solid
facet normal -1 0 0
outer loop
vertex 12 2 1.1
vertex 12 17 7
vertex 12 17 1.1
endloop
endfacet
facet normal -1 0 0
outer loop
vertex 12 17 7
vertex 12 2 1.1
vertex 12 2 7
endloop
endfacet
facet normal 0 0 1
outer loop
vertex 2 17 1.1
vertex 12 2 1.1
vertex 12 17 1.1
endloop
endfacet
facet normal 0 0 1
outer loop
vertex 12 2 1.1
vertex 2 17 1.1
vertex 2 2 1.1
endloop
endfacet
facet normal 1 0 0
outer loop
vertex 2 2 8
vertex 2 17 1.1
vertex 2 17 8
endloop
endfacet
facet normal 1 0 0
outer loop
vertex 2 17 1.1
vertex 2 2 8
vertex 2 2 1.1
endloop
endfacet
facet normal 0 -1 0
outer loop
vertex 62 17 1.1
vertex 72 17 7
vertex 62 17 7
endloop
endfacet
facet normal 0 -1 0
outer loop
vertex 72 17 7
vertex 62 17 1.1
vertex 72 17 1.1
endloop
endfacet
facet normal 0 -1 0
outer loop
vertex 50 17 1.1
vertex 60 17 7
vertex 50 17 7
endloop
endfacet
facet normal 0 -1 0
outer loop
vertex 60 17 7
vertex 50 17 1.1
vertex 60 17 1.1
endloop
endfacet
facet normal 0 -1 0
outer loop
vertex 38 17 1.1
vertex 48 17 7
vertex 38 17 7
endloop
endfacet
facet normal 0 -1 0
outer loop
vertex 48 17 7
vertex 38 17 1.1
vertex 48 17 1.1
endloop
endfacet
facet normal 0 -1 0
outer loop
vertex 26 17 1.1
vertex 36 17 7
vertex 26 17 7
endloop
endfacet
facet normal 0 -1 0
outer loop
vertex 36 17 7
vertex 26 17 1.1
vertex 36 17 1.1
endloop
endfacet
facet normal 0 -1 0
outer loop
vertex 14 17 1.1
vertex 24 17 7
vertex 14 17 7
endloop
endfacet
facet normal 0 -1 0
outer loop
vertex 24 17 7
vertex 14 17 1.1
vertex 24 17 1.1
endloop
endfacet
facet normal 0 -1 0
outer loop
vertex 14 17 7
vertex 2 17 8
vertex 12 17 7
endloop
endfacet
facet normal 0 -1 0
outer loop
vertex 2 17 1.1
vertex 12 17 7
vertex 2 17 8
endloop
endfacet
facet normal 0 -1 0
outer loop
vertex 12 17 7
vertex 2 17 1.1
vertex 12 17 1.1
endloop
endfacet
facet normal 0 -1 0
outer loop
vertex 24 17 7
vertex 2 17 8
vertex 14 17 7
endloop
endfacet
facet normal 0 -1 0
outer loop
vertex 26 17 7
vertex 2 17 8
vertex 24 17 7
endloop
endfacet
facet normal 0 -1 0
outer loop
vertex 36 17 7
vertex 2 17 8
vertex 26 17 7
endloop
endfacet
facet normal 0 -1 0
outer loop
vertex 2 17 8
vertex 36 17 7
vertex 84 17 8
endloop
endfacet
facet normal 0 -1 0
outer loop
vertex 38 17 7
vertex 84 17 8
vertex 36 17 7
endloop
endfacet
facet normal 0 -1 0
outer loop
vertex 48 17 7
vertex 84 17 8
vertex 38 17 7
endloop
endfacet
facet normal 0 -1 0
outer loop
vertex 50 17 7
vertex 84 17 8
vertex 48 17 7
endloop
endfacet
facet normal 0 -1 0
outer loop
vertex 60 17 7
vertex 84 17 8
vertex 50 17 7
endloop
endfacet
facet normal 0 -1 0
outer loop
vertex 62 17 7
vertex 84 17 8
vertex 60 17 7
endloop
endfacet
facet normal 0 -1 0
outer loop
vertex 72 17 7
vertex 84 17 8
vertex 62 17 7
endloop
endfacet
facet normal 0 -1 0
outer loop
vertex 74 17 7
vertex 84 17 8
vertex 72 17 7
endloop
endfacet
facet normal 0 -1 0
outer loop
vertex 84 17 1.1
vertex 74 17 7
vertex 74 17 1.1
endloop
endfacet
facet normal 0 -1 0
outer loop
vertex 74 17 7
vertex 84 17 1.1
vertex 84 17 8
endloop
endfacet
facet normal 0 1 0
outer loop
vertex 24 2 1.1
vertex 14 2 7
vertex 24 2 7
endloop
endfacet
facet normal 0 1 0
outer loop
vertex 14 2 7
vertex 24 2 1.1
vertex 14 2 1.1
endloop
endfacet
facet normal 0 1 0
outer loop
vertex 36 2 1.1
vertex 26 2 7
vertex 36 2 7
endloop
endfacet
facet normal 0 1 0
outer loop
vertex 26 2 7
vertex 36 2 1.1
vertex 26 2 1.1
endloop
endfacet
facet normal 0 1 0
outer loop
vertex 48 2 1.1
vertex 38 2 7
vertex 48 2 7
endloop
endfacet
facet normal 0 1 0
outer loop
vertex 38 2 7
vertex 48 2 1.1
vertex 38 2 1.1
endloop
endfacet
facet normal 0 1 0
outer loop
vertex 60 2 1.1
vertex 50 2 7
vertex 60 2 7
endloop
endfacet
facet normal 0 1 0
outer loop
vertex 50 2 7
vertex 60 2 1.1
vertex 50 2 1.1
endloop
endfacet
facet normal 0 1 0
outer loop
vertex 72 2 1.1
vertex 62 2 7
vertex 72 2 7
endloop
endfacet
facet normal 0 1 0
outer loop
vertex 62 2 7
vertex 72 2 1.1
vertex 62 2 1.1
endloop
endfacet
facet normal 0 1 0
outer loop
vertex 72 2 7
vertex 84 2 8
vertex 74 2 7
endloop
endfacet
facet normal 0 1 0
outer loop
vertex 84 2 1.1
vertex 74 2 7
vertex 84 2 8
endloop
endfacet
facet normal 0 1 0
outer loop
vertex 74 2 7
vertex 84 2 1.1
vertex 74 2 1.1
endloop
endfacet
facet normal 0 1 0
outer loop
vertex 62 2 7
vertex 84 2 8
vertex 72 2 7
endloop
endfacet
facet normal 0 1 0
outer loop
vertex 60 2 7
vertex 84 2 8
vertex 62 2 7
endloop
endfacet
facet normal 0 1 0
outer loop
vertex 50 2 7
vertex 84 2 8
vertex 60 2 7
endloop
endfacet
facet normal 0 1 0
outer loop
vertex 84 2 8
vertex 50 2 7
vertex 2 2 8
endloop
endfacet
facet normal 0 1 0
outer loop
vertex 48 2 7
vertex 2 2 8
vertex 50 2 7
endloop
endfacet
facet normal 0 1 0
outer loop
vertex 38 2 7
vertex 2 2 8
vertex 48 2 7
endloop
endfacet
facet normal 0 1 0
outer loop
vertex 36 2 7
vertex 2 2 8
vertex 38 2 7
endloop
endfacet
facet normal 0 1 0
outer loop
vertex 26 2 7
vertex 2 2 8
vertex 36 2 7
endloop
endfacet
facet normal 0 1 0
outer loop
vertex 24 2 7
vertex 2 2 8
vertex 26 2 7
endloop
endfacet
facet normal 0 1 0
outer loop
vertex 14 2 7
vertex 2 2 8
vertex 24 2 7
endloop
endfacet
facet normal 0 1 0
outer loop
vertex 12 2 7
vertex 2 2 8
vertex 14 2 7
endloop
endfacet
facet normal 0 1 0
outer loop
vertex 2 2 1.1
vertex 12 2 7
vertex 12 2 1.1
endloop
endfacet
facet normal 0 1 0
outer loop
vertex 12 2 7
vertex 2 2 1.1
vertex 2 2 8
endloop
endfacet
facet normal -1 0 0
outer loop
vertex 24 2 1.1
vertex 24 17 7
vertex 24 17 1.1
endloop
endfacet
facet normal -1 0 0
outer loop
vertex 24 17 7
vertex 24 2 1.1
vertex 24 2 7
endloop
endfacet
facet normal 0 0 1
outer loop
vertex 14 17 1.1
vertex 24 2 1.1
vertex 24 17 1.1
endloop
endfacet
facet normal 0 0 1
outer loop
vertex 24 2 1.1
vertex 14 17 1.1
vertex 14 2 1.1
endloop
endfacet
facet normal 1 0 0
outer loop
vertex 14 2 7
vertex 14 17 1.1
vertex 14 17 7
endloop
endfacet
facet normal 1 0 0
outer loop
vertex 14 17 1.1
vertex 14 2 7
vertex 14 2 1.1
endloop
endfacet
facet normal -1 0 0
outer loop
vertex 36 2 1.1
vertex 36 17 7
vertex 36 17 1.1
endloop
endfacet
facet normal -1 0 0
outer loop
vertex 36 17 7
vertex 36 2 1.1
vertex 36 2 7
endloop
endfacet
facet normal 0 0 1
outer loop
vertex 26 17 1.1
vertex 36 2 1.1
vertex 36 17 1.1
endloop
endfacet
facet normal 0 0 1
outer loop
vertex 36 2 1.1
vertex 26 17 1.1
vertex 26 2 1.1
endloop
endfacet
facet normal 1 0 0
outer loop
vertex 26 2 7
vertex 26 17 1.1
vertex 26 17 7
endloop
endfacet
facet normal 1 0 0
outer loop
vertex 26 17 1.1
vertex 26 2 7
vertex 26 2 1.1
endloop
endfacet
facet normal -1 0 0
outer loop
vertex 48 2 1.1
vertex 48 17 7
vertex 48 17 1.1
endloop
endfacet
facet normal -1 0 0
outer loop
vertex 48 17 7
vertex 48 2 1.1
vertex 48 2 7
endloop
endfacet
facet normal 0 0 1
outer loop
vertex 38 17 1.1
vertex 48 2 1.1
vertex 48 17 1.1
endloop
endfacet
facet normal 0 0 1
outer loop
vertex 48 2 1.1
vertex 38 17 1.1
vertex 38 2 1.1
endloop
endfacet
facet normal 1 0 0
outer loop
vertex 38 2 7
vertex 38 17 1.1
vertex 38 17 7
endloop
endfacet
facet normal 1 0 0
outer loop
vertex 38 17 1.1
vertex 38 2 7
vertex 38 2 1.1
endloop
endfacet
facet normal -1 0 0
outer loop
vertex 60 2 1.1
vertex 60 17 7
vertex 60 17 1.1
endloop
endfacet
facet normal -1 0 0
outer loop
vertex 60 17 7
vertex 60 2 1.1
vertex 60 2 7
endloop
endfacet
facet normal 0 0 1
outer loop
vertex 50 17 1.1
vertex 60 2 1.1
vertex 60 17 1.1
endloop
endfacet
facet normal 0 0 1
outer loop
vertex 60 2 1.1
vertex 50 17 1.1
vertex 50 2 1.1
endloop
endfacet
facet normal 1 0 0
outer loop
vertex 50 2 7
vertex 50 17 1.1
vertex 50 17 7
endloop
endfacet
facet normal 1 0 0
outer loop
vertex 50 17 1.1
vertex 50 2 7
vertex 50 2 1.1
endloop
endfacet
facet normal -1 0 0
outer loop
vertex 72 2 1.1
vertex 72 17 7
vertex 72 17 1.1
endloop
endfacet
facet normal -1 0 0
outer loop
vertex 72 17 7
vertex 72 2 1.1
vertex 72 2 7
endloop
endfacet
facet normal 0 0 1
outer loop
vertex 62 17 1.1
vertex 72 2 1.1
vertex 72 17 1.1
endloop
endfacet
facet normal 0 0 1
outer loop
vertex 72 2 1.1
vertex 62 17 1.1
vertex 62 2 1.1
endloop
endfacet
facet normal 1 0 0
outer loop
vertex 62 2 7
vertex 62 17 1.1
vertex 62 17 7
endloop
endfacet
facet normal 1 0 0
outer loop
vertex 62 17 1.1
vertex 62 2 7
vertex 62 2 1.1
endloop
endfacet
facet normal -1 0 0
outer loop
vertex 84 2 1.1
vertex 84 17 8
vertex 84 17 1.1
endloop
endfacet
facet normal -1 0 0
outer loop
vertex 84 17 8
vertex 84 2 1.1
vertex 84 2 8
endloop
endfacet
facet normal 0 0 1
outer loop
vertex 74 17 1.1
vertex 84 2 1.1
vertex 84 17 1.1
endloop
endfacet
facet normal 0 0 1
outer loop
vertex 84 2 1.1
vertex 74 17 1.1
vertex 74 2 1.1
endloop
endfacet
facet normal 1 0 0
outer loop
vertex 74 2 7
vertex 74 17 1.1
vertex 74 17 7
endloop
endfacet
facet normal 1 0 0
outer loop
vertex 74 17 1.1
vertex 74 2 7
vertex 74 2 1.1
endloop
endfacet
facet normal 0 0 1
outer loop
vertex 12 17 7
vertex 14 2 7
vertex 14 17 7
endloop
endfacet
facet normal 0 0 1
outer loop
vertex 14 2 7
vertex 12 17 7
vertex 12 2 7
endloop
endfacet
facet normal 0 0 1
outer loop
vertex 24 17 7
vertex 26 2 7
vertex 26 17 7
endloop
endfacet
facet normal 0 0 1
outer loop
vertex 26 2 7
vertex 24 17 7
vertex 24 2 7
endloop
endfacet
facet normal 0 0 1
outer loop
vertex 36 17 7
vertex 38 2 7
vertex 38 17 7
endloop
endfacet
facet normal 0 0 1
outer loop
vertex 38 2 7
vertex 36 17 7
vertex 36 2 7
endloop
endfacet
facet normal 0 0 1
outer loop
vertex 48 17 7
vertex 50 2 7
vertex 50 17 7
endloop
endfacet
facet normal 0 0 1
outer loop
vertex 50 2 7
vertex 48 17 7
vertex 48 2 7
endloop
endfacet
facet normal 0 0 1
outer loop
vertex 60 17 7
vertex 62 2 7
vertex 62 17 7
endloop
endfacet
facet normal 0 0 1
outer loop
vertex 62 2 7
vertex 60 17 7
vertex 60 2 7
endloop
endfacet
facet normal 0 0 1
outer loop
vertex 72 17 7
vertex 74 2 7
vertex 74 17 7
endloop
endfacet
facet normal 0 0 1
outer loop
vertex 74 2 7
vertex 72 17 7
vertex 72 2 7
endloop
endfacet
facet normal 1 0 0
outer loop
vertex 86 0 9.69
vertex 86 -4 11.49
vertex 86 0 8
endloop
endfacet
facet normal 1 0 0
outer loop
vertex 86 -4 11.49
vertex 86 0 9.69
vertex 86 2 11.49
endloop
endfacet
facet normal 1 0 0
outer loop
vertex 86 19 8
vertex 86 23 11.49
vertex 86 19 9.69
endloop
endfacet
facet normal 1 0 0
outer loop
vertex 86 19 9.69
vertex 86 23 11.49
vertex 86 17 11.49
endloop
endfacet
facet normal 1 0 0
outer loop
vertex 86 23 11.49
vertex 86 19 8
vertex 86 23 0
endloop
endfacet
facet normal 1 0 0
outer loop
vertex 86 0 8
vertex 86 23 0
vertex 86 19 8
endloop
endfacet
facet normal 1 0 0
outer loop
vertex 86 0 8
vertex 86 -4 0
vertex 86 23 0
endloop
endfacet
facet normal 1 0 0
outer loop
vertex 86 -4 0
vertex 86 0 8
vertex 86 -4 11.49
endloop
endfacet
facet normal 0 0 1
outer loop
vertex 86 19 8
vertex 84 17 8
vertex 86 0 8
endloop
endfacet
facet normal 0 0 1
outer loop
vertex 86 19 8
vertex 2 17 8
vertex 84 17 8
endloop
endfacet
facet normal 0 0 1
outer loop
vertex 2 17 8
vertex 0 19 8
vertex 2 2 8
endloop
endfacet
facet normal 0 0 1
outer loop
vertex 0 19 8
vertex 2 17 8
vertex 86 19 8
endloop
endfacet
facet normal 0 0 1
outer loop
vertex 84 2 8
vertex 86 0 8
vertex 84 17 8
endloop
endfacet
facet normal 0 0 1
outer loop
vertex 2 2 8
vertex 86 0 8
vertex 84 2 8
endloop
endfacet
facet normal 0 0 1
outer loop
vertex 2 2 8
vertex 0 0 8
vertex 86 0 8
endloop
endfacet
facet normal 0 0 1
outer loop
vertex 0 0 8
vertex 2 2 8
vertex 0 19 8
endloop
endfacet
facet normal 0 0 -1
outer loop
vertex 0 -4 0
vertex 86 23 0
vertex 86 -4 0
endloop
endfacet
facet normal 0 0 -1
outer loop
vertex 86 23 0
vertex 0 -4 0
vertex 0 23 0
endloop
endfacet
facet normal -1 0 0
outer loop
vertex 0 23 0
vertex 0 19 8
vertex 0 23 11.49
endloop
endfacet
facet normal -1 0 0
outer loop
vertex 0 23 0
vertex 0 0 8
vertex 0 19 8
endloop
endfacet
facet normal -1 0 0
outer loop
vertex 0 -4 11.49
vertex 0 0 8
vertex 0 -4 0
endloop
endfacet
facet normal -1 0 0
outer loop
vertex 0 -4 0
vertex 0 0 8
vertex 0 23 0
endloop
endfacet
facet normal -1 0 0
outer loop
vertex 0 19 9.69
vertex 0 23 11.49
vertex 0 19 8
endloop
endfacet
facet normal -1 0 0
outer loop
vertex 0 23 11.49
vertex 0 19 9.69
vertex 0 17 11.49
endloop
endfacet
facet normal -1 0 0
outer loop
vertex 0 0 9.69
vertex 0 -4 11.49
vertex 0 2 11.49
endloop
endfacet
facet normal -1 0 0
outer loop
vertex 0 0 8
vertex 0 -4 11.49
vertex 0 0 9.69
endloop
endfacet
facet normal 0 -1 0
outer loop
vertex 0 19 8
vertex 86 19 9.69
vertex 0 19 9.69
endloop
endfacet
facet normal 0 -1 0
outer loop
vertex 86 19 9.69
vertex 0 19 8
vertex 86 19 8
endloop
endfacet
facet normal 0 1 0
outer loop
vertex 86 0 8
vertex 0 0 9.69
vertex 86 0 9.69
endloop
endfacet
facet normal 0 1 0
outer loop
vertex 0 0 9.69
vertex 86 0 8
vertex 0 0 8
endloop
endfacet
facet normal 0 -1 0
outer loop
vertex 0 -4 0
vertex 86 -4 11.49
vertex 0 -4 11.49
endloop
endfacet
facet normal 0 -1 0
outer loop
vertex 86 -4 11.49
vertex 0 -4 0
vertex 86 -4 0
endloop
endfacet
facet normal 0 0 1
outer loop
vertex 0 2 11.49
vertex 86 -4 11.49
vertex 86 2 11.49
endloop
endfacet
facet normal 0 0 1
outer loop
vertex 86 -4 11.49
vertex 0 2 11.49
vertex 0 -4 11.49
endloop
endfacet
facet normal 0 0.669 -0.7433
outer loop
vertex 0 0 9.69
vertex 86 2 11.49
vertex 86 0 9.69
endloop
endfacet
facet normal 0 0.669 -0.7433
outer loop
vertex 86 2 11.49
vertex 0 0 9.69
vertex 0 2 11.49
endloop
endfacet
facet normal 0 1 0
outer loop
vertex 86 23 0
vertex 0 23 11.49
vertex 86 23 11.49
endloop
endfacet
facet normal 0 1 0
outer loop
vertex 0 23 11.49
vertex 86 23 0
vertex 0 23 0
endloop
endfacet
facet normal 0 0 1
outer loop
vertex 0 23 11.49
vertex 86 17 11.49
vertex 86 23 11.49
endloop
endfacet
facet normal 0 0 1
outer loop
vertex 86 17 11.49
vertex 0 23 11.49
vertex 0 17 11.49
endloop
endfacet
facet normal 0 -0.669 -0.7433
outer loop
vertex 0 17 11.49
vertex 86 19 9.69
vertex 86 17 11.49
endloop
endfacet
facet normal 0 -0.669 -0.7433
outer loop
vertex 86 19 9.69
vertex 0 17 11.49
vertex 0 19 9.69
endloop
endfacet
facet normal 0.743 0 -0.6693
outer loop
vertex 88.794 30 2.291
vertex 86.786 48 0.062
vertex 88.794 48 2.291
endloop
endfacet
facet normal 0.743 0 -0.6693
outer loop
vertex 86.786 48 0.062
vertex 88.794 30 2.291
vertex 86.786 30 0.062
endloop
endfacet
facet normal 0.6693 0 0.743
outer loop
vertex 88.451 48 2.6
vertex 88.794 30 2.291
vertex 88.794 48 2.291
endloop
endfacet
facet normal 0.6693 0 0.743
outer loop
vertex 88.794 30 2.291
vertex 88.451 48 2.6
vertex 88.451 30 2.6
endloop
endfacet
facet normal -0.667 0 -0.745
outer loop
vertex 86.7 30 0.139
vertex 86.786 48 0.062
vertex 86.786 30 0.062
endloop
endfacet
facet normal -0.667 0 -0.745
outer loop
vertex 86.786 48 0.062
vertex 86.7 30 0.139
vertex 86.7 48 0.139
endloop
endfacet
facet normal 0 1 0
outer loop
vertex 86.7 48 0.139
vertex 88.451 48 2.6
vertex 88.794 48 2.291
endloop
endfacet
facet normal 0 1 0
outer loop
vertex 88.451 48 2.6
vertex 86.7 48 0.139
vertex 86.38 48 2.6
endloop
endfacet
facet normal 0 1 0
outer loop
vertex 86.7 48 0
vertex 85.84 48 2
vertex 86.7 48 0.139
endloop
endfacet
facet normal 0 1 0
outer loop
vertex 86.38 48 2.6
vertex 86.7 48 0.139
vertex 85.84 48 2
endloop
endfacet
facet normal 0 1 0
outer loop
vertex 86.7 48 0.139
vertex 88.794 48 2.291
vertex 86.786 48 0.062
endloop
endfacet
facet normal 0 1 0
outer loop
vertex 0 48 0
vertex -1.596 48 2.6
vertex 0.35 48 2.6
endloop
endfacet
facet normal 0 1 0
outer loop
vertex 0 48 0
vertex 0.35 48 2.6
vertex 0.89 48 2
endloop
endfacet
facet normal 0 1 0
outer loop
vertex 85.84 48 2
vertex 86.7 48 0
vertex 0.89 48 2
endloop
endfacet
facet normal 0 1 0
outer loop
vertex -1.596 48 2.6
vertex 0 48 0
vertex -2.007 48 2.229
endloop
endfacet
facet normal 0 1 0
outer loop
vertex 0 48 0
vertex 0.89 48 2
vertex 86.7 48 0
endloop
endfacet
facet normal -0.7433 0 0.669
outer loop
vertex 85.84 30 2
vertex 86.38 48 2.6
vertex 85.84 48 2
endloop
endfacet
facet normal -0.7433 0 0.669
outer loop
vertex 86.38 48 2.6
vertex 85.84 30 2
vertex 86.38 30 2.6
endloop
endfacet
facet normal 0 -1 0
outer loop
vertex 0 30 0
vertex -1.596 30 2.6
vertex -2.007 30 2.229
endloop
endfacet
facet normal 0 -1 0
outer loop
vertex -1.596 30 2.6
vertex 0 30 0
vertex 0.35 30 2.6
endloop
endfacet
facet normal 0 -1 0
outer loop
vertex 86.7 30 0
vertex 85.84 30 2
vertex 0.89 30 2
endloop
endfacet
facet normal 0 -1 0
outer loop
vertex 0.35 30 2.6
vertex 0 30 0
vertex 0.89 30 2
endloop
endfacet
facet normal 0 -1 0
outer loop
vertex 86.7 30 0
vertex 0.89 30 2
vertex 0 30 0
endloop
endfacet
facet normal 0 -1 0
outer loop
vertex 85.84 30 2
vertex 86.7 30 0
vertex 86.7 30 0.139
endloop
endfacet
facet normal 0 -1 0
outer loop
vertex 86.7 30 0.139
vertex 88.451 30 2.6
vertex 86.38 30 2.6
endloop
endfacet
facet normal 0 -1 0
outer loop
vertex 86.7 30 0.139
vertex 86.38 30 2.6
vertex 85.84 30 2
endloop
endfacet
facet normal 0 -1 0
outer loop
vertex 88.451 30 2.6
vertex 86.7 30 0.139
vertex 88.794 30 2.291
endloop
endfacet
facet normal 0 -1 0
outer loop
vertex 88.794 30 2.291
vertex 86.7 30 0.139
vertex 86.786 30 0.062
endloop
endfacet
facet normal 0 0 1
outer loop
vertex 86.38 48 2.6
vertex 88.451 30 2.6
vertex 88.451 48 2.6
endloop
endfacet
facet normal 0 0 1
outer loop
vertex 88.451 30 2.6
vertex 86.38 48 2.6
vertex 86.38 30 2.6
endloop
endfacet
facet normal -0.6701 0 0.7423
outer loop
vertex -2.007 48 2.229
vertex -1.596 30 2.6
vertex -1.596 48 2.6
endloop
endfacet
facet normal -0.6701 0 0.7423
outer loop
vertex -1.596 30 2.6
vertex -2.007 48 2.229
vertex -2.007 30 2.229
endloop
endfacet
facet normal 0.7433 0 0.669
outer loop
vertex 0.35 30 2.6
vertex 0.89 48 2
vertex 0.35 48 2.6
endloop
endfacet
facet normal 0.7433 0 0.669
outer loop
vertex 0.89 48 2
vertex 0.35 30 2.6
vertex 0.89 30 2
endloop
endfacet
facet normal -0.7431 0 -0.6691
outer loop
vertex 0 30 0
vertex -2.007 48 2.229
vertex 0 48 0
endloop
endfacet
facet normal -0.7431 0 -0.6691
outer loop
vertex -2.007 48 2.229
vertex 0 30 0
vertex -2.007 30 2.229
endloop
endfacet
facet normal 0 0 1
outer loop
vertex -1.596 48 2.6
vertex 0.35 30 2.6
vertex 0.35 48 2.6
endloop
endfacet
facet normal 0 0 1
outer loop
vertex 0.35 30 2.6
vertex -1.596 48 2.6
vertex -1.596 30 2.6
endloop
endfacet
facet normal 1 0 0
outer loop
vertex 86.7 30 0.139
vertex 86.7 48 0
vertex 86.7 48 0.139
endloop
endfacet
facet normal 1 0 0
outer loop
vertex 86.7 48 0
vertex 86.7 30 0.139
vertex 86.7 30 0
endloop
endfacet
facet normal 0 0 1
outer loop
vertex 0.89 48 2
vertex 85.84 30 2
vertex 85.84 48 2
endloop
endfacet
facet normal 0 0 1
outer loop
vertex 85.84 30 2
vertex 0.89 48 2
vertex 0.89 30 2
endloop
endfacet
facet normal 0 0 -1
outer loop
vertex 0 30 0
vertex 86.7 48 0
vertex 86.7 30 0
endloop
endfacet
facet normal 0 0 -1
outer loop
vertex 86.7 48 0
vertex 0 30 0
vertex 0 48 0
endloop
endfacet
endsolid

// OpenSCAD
//widths for the pill compartments
wp = 10;
//depth for the pill compartments
dp = 15;
//floor thickness
ft = 1;

//wall size
ws = 2;
//side wall size
sws = 6;
//ridge width
rw = 2;
//ridge height
rh = 1.7;
//ridge thing height
rth = 1.8;
//pill box height
he = 8;
//wall height (center ones)
wh = he-1;

//lid handle
lh = 5;

//tolerance
tol = .5;



difference()
{

cube([wp*7+ws*8, dp+ws*2, he]);

union()
{
translate([ws,ws,0])
for (n = [0:6])
{
translate([n*wp+n*ws,0,ft+.1])
cube([wp,dp,10]);
}
translate([ws,ws,wh])
cube([wp*7+ws*6,dp,he-wh+.1]);

}
}


//lid thingy
module lidthingy()
{
translate([0,-sws+ws,0])
cube([ws*8+wp*7,sws-rw,he+rh]);


//ridge thingy
translate([0,-sws+ws,he+rh+rth-.01])
rotate([0,90,0])
//cylinder(r=sws/2, h=10, $fn=6);
linear_extrude(height=wp*7+ws*8)
polygon(points=[[0,0],[rth,0],[rth,sws-rw], [0,sws]]);

}


lidthingy();

mirror([0,1,0])
translate([0,-dp-ws*2,0])
lidthingy();



/*
//lid
translate([0,30,0])
{

cube([wp*7+ws*8+.7,dp+rw*2-tol*2,2]);
translate([-lh,0,0])
cube([lh,dp+rw*2-tol*2,4.5]);


difference()
{
translate([wp*7+ws*8-.7,0,.7*2])
rotate([0,42,0])
cube([2,dp+rw*2-tol*2,3]);


translate([wp*7+ws*8,-1,2.9])
cube([10,dp+rw*2-tol*2+2,2]);
}

}
*/


//alt lid
translate([0,30,0])
{

cube([wp*7+ws*8+.7,dp+rw*2-tol*2,2]);


difference()
{
translate([wp*7+ws*8-.7,0,.7*2])
rotate([0,42,0])
cube([2,dp+rw*2-tol*2,3]);


translate([wp*7+ws*8,-1,2.6])
cube([10,dp+rw*2-tol*2+2,2]);
}




difference()
{
translate([wp*7+ws*8-.7,0,.7*2])
rotate([0,42,0])
cube([2,dp+rw*2-tol*2,3]);


translate([wp*7+ws*8,-1,2.6])
cube([10,dp+rw*2-tol*2+2,2]);
}




difference()
{
translate([0,0,0])
rotate([0,-42,0])
cube([2,dp+rw*2-tol*2,3]);


translate([-3,-1,2.6])
cube([10,dp+rw*2-tol*2+2,2]);
}

}
